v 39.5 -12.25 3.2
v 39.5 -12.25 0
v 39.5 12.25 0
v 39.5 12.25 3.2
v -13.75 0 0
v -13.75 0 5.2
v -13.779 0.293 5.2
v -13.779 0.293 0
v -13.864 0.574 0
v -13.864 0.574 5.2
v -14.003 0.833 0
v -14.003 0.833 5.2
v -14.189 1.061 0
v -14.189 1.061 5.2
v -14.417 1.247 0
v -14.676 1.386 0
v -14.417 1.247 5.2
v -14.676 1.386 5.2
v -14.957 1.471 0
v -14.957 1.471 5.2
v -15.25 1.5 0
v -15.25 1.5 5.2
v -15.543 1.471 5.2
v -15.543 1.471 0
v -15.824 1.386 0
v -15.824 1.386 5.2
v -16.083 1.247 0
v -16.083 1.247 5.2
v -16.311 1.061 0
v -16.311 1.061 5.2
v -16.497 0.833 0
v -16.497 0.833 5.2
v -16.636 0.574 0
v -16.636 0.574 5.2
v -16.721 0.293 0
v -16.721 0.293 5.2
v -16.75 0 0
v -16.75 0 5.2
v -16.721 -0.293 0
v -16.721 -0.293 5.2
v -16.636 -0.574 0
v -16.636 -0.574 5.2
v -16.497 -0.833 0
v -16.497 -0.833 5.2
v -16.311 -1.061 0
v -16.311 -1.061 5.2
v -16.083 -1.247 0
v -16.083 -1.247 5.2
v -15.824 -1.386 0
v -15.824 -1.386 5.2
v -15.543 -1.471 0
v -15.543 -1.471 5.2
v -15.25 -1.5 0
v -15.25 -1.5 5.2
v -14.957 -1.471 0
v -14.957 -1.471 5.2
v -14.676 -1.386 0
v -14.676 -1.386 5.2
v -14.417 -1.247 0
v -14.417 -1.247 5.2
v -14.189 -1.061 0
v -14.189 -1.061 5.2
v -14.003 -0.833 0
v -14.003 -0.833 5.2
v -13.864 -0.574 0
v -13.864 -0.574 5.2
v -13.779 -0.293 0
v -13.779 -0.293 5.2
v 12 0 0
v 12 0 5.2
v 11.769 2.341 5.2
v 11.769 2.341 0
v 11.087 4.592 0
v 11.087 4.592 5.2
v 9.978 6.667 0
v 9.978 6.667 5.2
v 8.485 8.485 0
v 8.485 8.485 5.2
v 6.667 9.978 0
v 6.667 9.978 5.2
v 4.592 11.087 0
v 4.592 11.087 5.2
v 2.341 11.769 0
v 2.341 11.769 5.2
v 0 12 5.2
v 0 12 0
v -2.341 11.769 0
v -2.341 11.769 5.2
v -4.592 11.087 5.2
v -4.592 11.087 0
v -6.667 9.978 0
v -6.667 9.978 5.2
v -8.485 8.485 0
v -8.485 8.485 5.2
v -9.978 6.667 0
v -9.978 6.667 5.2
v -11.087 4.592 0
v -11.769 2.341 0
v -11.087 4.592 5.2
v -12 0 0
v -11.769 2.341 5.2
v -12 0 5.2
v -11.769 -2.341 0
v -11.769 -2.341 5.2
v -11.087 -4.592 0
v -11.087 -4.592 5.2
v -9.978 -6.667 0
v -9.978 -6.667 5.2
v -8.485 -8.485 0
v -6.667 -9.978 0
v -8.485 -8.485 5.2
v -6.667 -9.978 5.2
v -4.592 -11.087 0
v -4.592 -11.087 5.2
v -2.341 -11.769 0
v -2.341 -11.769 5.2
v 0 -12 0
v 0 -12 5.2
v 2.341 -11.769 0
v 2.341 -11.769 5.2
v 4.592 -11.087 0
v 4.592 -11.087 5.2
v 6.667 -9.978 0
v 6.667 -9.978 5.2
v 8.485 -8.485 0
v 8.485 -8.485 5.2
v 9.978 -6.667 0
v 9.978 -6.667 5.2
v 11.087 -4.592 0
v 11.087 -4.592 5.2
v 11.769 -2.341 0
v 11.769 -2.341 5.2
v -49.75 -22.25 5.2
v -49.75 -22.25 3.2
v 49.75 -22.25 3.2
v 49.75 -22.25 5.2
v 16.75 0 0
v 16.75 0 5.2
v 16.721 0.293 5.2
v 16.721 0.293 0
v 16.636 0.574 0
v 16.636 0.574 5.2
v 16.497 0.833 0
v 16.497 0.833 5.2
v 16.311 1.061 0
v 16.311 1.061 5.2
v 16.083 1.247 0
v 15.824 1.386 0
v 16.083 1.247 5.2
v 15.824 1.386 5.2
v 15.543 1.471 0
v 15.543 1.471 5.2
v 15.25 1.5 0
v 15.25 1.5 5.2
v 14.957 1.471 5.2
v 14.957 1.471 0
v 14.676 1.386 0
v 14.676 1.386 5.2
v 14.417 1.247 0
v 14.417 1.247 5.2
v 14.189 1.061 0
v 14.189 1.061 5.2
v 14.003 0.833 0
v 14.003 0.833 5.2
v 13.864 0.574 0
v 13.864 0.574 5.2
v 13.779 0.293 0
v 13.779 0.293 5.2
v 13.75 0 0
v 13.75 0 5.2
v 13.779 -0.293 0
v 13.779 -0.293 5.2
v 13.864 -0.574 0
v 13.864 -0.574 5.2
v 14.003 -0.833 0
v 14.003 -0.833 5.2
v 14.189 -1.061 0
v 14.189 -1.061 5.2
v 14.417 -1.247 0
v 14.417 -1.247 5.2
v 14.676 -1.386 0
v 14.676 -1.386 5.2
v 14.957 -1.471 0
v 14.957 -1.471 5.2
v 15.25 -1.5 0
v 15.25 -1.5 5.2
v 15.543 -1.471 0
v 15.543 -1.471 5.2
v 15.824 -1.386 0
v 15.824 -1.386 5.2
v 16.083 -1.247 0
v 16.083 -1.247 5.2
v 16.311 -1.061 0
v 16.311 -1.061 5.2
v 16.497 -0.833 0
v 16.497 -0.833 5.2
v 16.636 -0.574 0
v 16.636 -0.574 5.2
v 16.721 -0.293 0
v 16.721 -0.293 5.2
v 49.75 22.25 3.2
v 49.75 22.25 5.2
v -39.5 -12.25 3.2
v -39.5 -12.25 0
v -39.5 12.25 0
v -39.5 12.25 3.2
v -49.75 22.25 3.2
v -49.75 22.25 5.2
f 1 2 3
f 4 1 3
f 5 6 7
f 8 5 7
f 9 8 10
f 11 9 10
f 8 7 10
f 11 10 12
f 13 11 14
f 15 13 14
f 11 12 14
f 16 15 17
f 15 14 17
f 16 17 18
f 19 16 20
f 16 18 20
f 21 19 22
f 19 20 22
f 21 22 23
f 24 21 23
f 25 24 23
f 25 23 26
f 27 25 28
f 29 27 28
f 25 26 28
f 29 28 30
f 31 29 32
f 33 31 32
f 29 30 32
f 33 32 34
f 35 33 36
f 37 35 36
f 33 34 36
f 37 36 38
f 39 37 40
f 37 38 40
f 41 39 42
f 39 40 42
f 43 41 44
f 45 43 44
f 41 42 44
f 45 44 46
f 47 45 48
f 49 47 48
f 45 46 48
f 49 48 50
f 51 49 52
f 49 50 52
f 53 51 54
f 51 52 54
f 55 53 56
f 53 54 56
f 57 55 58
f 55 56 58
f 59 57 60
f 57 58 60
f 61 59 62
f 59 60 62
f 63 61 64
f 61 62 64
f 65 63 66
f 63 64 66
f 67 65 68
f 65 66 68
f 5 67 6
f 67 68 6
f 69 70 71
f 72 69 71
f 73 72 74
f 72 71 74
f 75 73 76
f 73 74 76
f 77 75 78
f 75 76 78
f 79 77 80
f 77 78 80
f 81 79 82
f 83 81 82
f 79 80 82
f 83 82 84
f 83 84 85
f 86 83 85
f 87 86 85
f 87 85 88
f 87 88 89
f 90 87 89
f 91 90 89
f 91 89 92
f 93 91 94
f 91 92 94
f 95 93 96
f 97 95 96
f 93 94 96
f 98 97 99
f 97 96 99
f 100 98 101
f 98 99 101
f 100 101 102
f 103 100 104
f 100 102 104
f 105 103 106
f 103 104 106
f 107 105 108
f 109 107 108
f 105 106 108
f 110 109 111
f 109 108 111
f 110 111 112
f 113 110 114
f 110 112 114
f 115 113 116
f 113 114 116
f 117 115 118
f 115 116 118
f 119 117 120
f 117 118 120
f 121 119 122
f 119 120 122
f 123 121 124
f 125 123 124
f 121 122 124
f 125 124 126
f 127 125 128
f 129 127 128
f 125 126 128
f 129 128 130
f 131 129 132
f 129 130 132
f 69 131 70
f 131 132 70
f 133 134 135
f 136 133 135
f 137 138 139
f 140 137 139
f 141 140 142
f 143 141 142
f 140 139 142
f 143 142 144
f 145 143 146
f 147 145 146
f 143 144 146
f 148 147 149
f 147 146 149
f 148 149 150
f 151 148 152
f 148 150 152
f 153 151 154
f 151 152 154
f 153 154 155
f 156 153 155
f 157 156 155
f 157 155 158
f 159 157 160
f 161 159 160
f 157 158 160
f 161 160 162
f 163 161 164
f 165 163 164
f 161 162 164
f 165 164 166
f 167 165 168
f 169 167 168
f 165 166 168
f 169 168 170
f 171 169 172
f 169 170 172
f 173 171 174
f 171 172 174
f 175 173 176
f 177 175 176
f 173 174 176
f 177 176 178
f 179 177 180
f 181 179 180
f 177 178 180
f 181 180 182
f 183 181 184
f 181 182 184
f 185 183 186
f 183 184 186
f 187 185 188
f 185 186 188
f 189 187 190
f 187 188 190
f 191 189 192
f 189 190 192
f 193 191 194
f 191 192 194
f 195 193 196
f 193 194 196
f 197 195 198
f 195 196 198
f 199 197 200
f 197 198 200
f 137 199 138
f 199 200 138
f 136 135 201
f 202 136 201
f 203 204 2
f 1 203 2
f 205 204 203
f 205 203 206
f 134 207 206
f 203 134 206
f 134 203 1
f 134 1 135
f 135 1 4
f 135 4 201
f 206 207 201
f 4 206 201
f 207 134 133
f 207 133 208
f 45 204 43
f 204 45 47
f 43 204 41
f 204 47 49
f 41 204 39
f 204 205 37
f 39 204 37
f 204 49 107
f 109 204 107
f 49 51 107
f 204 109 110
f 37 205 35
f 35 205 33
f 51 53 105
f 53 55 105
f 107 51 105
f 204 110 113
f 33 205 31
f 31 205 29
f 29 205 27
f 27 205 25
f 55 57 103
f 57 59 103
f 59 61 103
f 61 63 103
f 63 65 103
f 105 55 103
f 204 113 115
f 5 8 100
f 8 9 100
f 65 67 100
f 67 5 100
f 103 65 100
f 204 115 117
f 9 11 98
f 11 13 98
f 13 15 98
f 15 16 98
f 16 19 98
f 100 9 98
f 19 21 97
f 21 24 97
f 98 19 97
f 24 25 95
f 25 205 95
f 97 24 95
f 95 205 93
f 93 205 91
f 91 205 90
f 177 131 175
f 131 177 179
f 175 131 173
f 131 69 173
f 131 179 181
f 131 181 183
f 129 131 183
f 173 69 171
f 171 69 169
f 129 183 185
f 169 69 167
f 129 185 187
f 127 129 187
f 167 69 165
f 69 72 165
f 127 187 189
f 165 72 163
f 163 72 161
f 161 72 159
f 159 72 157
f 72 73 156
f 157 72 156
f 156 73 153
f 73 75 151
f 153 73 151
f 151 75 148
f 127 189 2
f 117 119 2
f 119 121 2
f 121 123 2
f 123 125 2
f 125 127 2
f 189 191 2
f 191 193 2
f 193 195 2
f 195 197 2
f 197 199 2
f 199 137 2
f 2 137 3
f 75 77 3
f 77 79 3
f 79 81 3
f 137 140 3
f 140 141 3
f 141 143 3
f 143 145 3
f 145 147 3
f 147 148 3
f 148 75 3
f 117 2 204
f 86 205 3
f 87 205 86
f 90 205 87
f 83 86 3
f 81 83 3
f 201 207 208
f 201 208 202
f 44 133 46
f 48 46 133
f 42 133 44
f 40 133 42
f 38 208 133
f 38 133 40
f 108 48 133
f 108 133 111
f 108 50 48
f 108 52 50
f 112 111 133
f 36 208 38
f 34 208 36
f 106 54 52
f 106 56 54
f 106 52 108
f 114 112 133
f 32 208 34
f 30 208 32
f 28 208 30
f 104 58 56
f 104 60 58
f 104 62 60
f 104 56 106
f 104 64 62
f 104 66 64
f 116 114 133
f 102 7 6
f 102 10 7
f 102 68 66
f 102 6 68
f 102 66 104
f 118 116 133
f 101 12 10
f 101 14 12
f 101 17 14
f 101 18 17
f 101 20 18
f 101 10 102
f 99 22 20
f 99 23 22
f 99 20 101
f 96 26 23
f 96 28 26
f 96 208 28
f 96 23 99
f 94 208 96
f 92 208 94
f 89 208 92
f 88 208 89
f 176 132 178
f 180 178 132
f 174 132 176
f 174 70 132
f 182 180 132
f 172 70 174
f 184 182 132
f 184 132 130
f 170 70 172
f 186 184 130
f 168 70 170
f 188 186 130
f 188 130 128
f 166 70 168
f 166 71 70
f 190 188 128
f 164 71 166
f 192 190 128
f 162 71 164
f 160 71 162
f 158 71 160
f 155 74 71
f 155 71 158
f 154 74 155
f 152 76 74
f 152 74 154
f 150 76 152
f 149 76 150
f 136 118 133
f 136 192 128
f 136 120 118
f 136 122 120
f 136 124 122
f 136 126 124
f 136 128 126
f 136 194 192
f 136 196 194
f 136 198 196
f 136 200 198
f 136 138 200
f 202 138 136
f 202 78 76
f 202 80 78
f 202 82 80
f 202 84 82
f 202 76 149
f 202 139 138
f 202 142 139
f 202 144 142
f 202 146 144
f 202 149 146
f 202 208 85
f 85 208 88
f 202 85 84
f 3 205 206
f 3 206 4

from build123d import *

# Parameters (mm, degrees)
F0_W     = 79
F0_H     = 24.5
F1_DEPTH = 3.2
F2_W     = 99.5
F2_H     = 44.5
F3_DEPTH = 2
F4_R     = 12
F4_R_2   = 1.5
F5_DEPTH = 5.2


with BuildPart() as f1:
    # F0 (on Top) → F1 (new body)
    with BuildSketch(Plane.XY):
        Rectangle(F0_W, F0_H)
    extrude(amount=F1_DEPTH)

    # F2 (on face) → F3 (join)
    with BuildSketch(Plane.XY.offset(3.2)):
        Rectangle(F2_W, F2_H)
    extrude(amount=F3_DEPTH)

    # F4 (on face) → F5 (cut, through all)
    with BuildSketch(Plane.XY.offset(5.2)):
        Circle(F4_R)
        with Locations((-15.25, 0)):
            Circle(F4_R_2)
        with Locations((15.25, 0)):
            Circle(F4_R_2)
    extrude(amount=-F5_DEPTH, mode=Mode.SUBTRACT)


solid = f1.part
